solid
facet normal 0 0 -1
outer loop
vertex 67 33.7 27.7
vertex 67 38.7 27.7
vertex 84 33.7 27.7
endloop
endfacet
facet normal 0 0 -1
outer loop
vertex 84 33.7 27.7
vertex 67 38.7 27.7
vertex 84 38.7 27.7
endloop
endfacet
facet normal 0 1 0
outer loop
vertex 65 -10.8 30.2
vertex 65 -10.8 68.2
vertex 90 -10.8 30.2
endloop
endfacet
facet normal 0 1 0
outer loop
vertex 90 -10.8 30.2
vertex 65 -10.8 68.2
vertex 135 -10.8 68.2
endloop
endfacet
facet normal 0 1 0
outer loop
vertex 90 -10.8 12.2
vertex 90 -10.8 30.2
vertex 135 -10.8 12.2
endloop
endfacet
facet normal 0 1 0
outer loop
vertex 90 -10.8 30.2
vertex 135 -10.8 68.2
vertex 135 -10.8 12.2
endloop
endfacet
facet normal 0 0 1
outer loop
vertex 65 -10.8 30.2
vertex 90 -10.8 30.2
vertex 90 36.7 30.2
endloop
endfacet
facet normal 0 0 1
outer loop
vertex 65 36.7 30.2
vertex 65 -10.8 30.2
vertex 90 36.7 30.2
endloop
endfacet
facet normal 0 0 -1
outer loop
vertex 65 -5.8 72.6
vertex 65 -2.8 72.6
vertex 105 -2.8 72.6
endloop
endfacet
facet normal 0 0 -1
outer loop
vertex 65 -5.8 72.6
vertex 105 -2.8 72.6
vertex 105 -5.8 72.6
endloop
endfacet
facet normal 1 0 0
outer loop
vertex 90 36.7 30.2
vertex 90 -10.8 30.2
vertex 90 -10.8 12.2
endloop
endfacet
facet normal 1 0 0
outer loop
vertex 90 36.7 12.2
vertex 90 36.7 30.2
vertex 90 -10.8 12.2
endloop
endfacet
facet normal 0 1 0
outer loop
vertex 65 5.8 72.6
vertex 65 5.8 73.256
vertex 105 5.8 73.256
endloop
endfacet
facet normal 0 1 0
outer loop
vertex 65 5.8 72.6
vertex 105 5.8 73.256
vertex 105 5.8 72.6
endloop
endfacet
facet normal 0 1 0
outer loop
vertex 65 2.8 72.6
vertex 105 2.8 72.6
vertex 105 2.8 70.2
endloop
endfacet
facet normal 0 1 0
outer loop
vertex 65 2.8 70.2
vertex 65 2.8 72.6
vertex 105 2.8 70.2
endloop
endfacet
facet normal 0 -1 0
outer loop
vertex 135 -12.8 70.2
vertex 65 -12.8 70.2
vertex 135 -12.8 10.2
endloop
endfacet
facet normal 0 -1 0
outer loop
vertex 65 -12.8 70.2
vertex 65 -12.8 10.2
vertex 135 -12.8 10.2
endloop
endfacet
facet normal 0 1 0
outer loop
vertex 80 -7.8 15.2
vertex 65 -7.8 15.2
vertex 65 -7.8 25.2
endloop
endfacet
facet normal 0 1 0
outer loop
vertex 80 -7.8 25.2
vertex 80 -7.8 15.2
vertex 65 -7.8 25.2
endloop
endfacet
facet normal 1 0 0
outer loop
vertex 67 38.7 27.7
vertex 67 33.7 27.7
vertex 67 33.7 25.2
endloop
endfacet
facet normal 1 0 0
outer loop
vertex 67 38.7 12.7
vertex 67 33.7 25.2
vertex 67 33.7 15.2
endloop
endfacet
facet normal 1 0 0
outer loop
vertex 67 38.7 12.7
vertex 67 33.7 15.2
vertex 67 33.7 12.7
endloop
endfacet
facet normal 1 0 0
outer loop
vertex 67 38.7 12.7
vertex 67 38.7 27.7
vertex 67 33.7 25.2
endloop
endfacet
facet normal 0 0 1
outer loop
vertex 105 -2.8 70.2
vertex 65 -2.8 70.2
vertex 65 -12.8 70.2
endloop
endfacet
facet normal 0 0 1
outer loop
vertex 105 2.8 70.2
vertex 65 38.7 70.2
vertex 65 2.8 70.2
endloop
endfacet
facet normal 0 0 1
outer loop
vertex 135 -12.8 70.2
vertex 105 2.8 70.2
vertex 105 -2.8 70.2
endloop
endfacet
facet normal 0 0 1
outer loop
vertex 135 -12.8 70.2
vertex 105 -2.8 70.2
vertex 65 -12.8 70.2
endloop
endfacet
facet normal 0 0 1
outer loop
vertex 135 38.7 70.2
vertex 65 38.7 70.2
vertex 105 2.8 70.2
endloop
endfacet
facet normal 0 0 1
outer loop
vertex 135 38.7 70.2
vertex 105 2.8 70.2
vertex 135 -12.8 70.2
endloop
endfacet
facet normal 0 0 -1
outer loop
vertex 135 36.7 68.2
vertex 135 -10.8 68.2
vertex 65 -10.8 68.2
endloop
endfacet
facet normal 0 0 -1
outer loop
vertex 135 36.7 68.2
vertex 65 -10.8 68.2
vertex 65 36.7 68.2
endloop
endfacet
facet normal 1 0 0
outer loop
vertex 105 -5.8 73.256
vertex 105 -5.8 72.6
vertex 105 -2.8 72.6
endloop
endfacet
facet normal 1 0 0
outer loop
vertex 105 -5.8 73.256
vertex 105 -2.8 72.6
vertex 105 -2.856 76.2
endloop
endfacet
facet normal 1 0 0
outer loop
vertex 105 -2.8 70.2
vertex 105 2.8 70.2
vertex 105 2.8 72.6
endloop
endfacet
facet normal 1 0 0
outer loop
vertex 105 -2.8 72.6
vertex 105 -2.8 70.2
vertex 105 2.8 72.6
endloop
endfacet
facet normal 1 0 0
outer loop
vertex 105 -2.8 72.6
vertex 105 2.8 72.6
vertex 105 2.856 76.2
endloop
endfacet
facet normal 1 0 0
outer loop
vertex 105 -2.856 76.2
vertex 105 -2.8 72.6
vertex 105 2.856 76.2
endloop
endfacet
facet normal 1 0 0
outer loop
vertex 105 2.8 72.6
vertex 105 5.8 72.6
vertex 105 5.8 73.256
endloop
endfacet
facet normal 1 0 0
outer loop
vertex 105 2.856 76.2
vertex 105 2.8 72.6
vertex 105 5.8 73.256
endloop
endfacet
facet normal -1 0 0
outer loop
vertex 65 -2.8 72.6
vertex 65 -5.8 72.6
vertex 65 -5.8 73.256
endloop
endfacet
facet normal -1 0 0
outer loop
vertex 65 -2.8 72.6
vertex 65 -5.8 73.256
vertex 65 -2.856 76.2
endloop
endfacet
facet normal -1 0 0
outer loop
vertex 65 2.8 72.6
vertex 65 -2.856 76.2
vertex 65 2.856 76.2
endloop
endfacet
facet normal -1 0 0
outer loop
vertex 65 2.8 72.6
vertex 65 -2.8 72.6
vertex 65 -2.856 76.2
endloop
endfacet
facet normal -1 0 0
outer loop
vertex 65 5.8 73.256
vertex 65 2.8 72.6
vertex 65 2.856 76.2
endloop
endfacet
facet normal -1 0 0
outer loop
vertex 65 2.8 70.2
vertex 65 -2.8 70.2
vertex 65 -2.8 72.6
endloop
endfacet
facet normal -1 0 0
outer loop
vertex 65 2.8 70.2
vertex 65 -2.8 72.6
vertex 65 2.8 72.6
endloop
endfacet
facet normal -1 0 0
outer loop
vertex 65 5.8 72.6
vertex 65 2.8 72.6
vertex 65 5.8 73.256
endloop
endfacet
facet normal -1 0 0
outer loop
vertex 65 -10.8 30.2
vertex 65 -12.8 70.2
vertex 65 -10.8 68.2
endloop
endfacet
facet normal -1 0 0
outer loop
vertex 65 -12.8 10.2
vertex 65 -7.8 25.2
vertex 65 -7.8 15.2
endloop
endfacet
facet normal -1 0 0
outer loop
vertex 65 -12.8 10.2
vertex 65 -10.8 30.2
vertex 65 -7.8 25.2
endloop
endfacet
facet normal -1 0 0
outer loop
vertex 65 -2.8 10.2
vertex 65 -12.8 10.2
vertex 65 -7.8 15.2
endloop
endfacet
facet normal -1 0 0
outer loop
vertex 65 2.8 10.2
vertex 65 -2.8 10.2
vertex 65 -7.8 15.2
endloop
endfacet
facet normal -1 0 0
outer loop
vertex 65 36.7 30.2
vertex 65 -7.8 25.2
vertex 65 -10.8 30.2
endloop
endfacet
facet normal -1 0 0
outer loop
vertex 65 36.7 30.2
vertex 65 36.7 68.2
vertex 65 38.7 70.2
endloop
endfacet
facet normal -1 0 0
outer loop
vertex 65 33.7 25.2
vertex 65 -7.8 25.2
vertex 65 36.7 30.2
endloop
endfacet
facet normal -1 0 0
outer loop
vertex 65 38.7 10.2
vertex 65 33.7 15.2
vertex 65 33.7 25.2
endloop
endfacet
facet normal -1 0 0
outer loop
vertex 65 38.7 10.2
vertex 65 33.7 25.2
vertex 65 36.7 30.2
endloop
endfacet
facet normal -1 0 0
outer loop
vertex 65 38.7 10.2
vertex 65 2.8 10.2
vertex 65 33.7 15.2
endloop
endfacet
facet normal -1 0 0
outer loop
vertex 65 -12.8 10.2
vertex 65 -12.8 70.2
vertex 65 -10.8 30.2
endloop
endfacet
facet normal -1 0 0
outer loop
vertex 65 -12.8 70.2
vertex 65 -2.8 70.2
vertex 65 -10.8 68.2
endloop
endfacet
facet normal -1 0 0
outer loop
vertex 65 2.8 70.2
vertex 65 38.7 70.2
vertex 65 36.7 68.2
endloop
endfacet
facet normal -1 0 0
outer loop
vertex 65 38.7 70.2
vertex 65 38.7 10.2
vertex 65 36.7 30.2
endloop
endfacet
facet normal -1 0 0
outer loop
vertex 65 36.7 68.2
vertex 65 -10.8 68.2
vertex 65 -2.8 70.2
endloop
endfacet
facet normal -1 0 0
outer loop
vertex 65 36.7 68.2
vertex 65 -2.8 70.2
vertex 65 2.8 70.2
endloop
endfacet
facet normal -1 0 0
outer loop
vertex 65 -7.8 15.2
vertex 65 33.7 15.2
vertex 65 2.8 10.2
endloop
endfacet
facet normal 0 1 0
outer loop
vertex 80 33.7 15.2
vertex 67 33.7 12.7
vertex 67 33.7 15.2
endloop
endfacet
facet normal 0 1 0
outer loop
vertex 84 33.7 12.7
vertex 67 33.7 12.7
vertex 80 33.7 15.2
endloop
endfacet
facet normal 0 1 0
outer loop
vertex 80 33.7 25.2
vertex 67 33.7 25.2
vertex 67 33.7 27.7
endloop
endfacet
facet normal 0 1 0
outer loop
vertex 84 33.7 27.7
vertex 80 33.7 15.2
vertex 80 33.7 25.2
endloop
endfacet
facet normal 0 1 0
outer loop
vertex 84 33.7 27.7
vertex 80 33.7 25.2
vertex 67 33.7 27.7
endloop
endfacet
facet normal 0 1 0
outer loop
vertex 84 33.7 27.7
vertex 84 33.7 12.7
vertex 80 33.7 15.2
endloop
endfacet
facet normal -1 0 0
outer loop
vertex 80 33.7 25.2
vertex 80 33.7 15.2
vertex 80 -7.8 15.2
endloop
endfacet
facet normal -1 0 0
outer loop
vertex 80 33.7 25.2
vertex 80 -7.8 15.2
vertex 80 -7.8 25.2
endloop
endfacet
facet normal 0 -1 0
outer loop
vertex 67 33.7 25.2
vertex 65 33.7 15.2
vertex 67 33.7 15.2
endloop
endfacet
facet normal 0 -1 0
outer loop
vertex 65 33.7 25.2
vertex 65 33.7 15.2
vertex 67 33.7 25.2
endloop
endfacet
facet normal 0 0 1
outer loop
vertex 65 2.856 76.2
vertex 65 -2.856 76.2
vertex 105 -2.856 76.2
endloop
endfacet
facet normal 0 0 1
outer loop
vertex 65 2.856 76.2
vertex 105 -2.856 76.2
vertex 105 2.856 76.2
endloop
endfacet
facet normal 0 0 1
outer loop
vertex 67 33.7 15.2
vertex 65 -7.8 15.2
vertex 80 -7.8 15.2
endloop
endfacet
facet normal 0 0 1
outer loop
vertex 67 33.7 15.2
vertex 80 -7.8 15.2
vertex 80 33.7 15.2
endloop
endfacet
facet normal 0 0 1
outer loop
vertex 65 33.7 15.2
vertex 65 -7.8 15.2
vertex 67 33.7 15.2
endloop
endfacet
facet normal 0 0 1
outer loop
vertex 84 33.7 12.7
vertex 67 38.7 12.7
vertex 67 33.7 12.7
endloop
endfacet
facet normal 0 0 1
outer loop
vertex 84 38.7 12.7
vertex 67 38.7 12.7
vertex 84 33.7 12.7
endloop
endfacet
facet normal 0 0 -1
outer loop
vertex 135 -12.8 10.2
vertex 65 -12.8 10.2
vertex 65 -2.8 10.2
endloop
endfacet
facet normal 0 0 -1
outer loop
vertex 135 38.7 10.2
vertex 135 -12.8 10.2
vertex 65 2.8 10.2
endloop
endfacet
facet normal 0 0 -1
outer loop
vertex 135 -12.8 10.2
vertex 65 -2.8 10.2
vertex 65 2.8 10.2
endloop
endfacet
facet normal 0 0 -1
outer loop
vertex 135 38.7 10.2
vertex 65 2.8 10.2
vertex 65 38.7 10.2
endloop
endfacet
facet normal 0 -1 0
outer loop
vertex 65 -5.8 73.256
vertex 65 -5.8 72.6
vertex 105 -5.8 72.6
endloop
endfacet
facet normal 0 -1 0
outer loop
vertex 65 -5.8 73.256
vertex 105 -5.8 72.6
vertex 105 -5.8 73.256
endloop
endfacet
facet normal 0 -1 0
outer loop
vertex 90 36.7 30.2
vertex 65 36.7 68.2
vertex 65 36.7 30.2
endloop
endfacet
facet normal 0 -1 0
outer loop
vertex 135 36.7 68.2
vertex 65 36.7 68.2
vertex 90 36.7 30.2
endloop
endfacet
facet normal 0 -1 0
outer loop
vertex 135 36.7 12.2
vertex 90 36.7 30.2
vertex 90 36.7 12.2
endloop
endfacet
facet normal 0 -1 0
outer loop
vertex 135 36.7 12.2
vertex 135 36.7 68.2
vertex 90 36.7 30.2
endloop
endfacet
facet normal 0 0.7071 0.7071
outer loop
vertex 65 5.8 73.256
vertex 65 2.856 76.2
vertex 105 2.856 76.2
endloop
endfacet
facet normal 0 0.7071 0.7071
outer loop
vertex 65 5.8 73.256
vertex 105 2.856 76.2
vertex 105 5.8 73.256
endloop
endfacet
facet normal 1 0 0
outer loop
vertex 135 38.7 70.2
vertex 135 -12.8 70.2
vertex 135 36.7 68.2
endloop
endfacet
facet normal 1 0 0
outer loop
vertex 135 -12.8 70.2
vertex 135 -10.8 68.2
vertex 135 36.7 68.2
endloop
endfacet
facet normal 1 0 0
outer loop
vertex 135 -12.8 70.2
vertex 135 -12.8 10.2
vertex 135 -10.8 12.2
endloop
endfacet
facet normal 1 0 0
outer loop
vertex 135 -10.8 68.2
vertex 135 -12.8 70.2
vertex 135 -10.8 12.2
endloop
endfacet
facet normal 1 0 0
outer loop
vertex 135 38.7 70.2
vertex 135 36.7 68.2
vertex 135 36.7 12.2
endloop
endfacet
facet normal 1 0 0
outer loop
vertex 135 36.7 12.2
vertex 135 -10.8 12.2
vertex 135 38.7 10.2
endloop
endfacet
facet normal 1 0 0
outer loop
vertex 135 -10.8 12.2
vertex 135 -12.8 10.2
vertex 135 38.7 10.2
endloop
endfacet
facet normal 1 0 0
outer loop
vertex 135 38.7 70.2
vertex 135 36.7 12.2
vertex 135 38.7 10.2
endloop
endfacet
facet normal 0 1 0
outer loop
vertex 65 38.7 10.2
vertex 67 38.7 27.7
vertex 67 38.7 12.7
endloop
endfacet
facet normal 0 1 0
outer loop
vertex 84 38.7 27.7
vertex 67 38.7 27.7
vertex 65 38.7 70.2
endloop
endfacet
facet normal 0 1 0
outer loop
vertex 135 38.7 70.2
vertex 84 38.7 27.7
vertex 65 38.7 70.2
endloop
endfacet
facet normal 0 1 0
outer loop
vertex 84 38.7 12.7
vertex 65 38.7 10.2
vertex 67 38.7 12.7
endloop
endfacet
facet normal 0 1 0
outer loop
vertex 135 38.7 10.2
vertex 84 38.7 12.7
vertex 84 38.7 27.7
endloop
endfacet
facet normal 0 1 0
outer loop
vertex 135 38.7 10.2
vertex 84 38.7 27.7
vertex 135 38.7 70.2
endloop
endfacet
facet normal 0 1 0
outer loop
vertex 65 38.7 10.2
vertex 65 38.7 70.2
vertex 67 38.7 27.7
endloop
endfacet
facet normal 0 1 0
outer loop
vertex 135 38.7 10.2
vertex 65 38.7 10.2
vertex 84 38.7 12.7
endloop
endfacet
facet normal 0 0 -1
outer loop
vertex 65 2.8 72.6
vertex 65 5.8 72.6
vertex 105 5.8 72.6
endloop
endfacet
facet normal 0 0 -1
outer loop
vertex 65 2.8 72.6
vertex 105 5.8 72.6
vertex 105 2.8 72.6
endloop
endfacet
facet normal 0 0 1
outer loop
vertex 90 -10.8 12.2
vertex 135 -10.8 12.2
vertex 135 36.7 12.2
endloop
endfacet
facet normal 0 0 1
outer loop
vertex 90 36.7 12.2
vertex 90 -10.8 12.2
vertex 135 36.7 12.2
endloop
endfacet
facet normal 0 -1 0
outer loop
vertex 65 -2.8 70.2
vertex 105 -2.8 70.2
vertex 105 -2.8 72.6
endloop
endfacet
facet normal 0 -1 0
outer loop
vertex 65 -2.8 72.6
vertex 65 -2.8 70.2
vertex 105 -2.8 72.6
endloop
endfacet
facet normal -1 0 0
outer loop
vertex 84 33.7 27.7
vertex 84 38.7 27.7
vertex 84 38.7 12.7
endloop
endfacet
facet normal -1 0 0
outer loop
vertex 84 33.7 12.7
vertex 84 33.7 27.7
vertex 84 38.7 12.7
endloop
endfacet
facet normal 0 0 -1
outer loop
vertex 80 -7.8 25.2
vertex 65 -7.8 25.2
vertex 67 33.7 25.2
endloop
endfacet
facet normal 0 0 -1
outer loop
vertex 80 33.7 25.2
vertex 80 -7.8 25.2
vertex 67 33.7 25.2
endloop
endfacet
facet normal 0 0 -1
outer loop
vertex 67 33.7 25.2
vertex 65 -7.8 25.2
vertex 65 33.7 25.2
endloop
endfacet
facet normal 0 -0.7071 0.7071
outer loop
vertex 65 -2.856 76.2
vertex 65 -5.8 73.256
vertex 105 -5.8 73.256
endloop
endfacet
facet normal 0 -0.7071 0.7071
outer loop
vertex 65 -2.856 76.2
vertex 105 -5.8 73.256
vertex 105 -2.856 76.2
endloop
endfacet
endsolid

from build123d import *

# Parameters (mm, degrees)
SKETCH1_R            = 2.1
BOSS_EXTRUDE1_DEPTH  = 65
SKETCH84_W           = 0.2
SKETCH84_H           = 5.6
BOSS_EXTRUDE8_DEPTH  = 40
SKETCH86_W           = 21.745720746
SKETCH86_H           = 21.517119214
CUT_EXTRUDE59_DEPTH  = 67.55103305
SKETCH87_W           = 20
SKETCH87_H           = 51.5
SKETCH87_W_2         = 10
SKETCH87_H_2         = 41.5
BOSS_EXTRUDE9_DEPTH  = 70
SKETCH88_W           = 17
SKETCH88_H           = 15
CUT_EXTRUDE60_DEPTH  = 5
SKETCH89_W           = 20
SKETCH89_H           = 51.5
BOSS_EXTRUDE10_DEPTH = 50
SKETCH90_W           = 10
SKETCH90_H           = 41.5
BOSS_EXTRUDE11_DEPTH = 5
SKETCH91_W           = 16
SKETCH91_H           = 47.5
CUT_EXTRUDE61_DEPTH  = 30
SKETCH92_W           = 70
SKETCH92_H           = 51.5
BOSS_EXTRUDE12_DEPTH = 40
BOSS_EXTRUDE13_DEPTH = 40
SKETCH94_W           = 13.084115127
SKETCH94_H           = 30.286066168
CUT_EXTRUDE62_DEPTH  = 40
SKETCH95_W           = 56
SKETCH95_H           = 47.5
CUT_EXTRUDE63_DEPTH  = 45
SKETCH97_W           = 37
SKETCH97_H           = 45.5
CUT_EXTRUDE64_DEPTH  = 45
SKETCH98_W           = 38
SKETCH98_H           = 47.5
CUT_EXTRUDE65_DEPTH  = 45


with BuildPart() as part:
    # Sketch1 → Boss-Extrude1 (new body)
    with BuildSketch(Plane(origin=(0, 0, 0), x_dir=(0, 0, -1), z_dir=(1, 0, 0))):
        with BuildLine():
            Line((-10, 9), (-10, 3))
            Line((-10, 3), (-8, 3))
            Line((-8, 3), (-8, 6))
            Line((-8, 6), (-7.060660172, 6))
            Line((-7.060660172, 6), (-4, 2.939339828))
            Line((-4, 2.939339828), (-4, -2.939339828))
            Line((-4, -2.939339828), (-7.060660172, -6))
            Line((-7.060660172, -6), (-8, -6))
            Line((-8, -6), (-8, -3))
            Line((-8, -3), (-10, -3))
            Line((-10, -3), (-10, -9))
            ThreePointArc((-10, -9), (-9.707106781, -9.707106781), (-9, -10))
            Line((-9, -10), (-3, -10))
            Line((-3, -10), (-3, -8))
            Line((-3, -8), (-6, -8))
            Line((-6, -8), (-6, -7.060660172))
            Line((-6, -7.060660172), (-2.939339828, -4))
            Line((-2.939339828, -4), (2.939339828, -4))
            Line((2.939339828, -4), (6, -7.060660172))
            Line((6, -7.060660172), (6, -8))
            Line((6, -8), (3, -8))
            Line((3, -8), (3, -10))
            Line((3, -10), (9, -10))
            ThreePointArc((9, -10), (9.707106781, -9.707106781), (10, -9))
            Line((10, -9), (10, -3))
            Line((10, -3), (8, -3))
            Line((8, -3), (8, -6))
            Line((8, -6), (7.060660172, -6))
            Line((7.060660172, -6), (4, -2.939339828))
            Line((4, -2.939339828), (4, 2.939339828))
            Line((4, 2.939339828), (7.060660172, 6))
            Line((7.060660172, 6), (8, 6))
            Line((8, 6), (8, 3))
            Line((8, 3), (10, 3))
            Line((10, 3), (10, 9))
            ThreePointArc((10, 9), (9.707106781, 9.707106781), (9, 10))
            Line((9, 10), (3, 10))
            Line((3, 10), (3, 8))
            Line((3, 8), (6, 8))
            Line((6, 8), (6, 7.060660172))
            Line((6, 7.060660172), (2.939339828, 4))
            Line((2.939339828, 4), (-2.939339828, 4))
            Line((-2.939339828, 4), (-6, 7.060660172))
            Line((-6, 7.060660172), (-6, 8))
            Line((-6, 8), (-3, 8))
            Line((-3, 8), (-3, 10))
            Line((-3, 10), (-9, 10))
            ThreePointArc((-9, 10), (-9.707106781, 9.707106781), (-10, 9))
        make_face()
        Circle(SKETCH1_R, mode=Mode.SUBTRACT)
    extrude(amount=BOSS_EXTRUDE1_DEPTH)

    # Sketch86 → Cut-Extrude59 (cut, through all)
    with BuildSketch(Plane(origin=(65, 0, 0), x_dir=(0, 0, -1), z_dir=(1, 0, 0))):
        with Locations((0.085738745, -0.242889128)):
            Rectangle(SKETCH86_W, SKETCH86_H)
    extrude(amount=-CUT_EXTRUDE59_DEPTH, mode=Mode.SUBTRACT)


with BuildPart() as body_2:
    # Sketch84 → Boss-Extrude8 (new body)
    with BuildSketch(Plane(origin=(65, 0, 0), x_dir=(0, 0, -1), z_dir=(1, 0, 0))):
        with Locations((-10.1, 0)):
            Rectangle(SKETCH84_W, SKETCH84_H)
        with Locations((-9.9, 0)):
            Rectangle(SKETCH84_W, SKETCH84_H)
        Polygon((-7.8, 5.8), (-7.143502884, 5.8), (-4.2, 2.856497116), (-4.2, -2.856497116), (-7.143502884, -5.8), (-7.8, -5.8), (-7.8, -2.8), (-9.8, -2.8), (-9.8, 2.8), (-7.8, 2.8), align=None)
    extrude(amount=BOSS_EXTRUDE8_DEPTH)

    # Sketch87 → Boss-Extrude9 (add)
    with BuildSketch(Plane.ZY.offset(-65)):
        with Locations((20.2, 12.95)):
            Rectangle(SKETCH87_W, SKETCH87_H)
        with Locations((20.2, 12.95)):
            Rectangle(SKETCH87_W_2, SKETCH87_H_2, mode=Mode.SUBTRACT)
    extrude(amount=-BOSS_EXTRUDE9_DEPTH)

    # Sketch88 → Cut-Extrude60 (cut)
    with BuildSketch(Plane(origin=(0, 38.7, 0), x_dir=(1, 0, 0), z_dir=(0, 1, 0))):
        with Locations((75.5, -20.2)):
            Rectangle(SKETCH88_W, SKETCH88_H)
    extrude(amount=-CUT_EXTRUDE60_DEPTH, mode=Mode.SUBTRACT)

    # Sketch89 → Boss-Extrude10 (add)
    with BuildSketch(Plane(origin=(135, 0, 0), x_dir=(0, 0, -1), z_dir=(1, 0, 0))):
        with Locations((-20.2, 12.95)):
            Rectangle(SKETCH89_W, SKETCH89_H)
    extrude(amount=-BOSS_EXTRUDE10_DEPTH)

    # Sketch90 → Boss-Extrude11 (add)
    with BuildSketch(Plane.ZY.offset(-85)):
        with Locations((20.2, 12.95)):
            Rectangle(SKETCH90_W, SKETCH90_H)
    extrude(amount=BOSS_EXTRUDE11_DEPTH)

    # Sketch91 → Cut-Extrude61 (cut)
    with BuildSketch(Plane(origin=(135, 0, 0), x_dir=(0, 0, -1), z_dir=(1, 0, 0))):
        with Locations((-20.2, 12.95)):
            Rectangle(SKETCH91_W, SKETCH91_H)
    extrude(amount=-CUT_EXTRUDE61_DEPTH, mode=Mode.SUBTRACT)

    # Sketch92 → Boss-Extrude12 (add)
    with BuildSketch(Plane.XY.offset(30.2)):
        with Locations((100, 12.95)):
            Rectangle(SKETCH92_W, SKETCH92_H)
    extrude(amount=BOSS_EXTRUDE12_DEPTH)

    # Sketch93 → Boss-Extrude13 (add)
    with BuildSketch(Plane.ZY.offset(-65)):
        Polygon((72.6, 2.8), (70.2, 2.8), (70.2, -2.8), (72.6, -2.8), (72.6, -5.8), (73.256497116, -5.8), (76.2, -2.856497116), (76.2, 2.856497116), (73.256497116, 5.8), (72.6, 5.8), align=None)
    extrude(amount=-BOSS_EXTRUDE13_DEPTH)

    # Sketch94 → Cut-Extrude62 (cut)
    with BuildSketch(Plane.ZY.offset(-65)):
        with Locations((3.657942437, 5.120137749)):
            Rectangle(SKETCH94_W, SKETCH94_H)
    extrude(amount=-CUT_EXTRUDE62_DEPTH, mode=Mode.SUBTRACT)

    # Sketch95 → Cut-Extrude63 (cut)
    with BuildSketch(Plane(origin=(135, 0, 0), x_dir=(0, 0, -1), z_dir=(1, 0, 0))):
        with Locations((-40.2, 12.95)):
            Rectangle(SKETCH95_W, SKETCH95_H)
    extrude(amount=-CUT_EXTRUDE63_DEPTH, mode=Mode.SUBTRACT)

    # Sketch97 → Cut-Extrude64 (cut)
    with BuildSketch(Plane.ZY.offset(-65)):
        with Locations((48.7, 12.95)):
            Rectangle(SKETCH97_W, SKETCH97_H)
    extrude(amount=-CUT_EXTRUDE64_DEPTH, mode=Mode.SUBTRACT)

    # Sketch98 → Cut-Extrude65 (cut)
    with BuildSketch(Plane(origin=(90, 0, 0), x_dir=(0, 0, -1), z_dir=(1, 0, 0))):
        with Locations((-49.2, 12.95)):
            Rectangle(SKETCH98_W, SKETCH98_H)
    extrude(amount=-CUT_EXTRUDE65_DEPTH, mode=Mode.SUBTRACT)


solid = body_2.part
